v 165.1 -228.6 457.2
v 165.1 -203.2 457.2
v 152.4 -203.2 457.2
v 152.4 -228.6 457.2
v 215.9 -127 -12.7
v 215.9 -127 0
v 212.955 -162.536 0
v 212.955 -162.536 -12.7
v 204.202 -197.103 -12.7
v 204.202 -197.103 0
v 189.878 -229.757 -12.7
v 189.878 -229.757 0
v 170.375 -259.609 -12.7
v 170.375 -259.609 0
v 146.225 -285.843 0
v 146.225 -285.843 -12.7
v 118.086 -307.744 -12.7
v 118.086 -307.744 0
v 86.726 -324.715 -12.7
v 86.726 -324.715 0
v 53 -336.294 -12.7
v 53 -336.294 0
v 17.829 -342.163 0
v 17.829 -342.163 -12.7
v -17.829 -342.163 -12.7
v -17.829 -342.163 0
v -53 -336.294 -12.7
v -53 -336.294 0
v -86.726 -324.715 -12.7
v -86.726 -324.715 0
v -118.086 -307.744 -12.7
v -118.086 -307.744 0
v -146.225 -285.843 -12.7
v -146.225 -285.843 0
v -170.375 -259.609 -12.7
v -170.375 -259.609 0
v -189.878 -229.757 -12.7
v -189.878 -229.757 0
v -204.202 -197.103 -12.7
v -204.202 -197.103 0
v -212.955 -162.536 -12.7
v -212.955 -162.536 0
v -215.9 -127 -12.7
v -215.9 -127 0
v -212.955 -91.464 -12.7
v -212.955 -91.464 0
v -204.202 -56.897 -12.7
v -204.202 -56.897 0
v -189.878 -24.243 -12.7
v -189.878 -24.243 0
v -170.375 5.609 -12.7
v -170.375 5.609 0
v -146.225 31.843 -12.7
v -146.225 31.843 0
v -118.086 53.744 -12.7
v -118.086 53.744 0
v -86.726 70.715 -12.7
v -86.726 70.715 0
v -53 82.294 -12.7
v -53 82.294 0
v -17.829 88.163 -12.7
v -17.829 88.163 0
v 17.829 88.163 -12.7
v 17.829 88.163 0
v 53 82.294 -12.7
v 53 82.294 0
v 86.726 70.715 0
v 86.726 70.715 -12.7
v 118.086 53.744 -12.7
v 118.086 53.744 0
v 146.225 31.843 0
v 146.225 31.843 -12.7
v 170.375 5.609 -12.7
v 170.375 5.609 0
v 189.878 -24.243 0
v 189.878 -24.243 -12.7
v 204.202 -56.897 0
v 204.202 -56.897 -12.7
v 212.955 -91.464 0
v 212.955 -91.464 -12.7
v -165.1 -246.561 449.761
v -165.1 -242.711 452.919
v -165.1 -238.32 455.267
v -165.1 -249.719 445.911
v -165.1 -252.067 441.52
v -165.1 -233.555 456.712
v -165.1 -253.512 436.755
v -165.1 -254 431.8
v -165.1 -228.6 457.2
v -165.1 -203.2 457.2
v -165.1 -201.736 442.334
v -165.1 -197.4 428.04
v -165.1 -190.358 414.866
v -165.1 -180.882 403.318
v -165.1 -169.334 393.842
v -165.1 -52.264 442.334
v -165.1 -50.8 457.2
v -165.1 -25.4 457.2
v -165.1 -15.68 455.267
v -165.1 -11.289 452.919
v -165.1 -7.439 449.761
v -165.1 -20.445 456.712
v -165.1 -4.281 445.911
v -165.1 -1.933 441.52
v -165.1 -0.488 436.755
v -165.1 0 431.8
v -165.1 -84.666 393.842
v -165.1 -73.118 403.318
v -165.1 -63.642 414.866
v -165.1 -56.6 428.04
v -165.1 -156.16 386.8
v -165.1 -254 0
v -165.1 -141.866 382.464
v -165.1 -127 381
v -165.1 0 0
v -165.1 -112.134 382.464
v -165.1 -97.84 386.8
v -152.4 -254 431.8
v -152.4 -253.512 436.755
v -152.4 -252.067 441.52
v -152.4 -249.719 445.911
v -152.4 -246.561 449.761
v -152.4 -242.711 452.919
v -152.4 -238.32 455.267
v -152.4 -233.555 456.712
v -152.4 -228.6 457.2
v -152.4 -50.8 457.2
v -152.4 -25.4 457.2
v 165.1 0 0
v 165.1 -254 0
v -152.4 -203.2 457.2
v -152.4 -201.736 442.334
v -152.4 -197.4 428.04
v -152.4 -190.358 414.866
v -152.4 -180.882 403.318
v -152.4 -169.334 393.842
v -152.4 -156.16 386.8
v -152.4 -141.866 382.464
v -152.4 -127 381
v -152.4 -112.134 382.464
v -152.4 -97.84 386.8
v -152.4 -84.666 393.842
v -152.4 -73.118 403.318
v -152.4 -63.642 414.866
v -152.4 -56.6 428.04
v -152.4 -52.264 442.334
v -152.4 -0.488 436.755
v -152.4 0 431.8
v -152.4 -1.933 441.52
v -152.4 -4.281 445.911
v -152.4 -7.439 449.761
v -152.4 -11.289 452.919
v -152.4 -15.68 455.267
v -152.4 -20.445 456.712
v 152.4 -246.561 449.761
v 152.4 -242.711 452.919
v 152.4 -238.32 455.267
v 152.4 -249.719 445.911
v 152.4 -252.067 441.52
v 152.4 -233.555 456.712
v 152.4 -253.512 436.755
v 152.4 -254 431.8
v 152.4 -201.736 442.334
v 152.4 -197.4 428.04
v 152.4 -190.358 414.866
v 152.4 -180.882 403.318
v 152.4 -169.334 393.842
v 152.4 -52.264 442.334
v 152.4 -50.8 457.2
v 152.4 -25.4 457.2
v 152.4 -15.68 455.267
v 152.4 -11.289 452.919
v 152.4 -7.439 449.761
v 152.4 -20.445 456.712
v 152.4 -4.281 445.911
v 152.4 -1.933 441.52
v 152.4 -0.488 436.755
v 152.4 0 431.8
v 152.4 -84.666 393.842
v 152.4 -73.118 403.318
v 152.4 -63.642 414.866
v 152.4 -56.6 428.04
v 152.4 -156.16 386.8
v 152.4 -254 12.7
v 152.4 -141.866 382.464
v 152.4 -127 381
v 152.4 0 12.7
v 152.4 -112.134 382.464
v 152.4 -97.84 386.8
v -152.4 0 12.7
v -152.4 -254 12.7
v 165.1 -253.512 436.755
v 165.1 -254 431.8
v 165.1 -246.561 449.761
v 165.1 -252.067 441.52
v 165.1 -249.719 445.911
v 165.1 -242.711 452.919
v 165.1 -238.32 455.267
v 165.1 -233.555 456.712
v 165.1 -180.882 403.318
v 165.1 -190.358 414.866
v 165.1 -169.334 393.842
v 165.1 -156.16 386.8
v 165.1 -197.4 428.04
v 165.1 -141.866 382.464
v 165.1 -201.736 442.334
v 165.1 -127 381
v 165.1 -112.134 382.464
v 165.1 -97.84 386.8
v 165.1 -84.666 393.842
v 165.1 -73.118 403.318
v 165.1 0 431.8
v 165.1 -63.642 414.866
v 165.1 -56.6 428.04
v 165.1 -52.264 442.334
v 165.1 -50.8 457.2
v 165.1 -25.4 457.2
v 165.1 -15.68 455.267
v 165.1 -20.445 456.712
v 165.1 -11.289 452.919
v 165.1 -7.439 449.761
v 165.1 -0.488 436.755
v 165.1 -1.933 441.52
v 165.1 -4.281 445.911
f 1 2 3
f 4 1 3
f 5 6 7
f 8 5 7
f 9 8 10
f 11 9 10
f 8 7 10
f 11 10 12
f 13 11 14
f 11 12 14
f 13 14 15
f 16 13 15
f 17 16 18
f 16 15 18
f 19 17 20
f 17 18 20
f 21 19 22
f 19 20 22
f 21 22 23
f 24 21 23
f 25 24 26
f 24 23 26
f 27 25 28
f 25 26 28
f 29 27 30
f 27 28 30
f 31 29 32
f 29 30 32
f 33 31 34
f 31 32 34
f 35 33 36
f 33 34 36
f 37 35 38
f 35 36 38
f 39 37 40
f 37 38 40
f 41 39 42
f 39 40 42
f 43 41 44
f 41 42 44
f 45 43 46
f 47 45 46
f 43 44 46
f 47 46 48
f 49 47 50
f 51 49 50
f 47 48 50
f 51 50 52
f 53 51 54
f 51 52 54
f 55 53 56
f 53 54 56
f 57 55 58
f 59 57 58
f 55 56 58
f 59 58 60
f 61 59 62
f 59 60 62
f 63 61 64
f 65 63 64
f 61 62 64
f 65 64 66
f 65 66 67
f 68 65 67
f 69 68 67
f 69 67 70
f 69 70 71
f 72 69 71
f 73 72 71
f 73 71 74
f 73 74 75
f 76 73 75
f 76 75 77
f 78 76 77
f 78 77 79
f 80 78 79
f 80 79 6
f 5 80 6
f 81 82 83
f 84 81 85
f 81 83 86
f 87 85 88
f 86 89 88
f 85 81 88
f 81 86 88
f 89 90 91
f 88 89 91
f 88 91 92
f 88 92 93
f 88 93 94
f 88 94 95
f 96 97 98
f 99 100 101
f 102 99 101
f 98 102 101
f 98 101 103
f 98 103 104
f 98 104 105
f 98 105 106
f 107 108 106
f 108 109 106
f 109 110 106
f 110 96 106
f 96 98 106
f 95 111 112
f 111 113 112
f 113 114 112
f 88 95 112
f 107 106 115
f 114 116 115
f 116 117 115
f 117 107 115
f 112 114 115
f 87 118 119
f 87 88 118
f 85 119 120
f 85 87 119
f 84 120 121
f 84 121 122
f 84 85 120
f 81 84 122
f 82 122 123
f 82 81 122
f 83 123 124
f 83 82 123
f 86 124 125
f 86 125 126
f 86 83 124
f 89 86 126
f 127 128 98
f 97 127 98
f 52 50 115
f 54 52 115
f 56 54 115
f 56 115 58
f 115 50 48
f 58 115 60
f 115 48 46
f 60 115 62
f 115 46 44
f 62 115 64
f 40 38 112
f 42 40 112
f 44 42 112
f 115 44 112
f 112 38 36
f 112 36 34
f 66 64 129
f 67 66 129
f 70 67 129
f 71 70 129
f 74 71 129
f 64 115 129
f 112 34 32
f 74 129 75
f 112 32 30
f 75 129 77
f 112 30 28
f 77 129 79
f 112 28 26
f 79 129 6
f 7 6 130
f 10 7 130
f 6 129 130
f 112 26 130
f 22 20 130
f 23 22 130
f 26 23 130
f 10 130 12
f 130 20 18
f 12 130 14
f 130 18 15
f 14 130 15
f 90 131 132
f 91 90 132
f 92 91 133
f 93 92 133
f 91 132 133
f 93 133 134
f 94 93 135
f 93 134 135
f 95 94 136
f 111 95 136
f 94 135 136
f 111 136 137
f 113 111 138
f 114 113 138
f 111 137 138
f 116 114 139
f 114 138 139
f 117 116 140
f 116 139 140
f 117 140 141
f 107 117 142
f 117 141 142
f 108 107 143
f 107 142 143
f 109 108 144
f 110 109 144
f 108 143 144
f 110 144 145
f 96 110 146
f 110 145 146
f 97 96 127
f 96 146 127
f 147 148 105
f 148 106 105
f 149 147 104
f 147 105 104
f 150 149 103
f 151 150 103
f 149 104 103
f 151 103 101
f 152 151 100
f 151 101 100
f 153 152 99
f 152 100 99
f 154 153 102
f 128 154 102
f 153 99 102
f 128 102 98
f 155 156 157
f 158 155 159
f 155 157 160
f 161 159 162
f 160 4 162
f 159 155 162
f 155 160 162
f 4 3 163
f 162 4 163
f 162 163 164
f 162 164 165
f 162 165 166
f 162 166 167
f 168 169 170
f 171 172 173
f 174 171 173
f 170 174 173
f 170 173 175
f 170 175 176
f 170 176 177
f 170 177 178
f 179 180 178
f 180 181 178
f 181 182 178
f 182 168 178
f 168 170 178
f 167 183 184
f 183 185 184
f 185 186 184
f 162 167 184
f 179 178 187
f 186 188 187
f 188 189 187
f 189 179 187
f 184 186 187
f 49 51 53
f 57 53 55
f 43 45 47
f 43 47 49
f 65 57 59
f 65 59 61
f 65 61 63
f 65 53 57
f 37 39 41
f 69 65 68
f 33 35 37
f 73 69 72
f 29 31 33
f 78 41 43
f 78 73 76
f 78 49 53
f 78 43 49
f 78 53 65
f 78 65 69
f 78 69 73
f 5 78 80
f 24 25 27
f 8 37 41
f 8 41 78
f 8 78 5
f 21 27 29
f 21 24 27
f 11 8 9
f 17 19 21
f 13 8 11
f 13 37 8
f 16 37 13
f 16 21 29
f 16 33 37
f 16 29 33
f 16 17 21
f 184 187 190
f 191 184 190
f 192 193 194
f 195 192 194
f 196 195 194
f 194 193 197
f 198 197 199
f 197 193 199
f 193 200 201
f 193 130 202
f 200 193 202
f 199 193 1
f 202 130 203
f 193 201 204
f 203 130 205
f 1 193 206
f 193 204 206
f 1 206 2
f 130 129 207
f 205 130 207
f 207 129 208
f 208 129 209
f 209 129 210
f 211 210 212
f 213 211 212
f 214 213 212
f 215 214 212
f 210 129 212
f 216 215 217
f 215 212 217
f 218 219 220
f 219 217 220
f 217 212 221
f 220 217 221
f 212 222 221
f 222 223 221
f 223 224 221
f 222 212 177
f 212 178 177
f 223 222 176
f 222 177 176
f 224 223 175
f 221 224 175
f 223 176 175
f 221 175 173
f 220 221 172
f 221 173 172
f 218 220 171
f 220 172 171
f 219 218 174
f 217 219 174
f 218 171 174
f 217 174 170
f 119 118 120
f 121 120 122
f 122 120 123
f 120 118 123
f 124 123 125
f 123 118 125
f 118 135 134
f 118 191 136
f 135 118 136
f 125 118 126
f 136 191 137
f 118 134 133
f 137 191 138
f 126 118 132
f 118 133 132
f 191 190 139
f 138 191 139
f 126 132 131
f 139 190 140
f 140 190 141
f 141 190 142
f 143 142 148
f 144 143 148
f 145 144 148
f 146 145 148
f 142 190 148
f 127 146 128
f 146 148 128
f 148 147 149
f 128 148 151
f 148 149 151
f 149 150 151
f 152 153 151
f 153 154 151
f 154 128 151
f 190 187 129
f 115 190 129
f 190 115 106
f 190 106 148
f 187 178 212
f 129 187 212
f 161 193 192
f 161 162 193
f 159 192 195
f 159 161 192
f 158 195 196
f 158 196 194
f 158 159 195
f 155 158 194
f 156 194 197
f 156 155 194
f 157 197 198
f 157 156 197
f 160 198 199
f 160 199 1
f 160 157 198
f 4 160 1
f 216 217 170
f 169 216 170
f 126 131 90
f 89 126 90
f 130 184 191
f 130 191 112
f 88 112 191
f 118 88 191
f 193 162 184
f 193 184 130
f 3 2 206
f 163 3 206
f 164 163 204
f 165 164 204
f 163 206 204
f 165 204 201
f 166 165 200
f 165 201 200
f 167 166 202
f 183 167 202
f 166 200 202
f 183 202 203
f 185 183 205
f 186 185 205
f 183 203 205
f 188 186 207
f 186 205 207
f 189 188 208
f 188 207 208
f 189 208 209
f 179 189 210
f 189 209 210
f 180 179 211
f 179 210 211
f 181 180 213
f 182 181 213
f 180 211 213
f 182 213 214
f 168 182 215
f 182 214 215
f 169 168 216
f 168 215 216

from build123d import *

# Parameters (mm, degrees)
F1_DEPTH = 254
F2_R     = 215.9
F3_DEPTH = 12.7
F5_DEPTH = 381.001
F6_R     = 25.4


with BuildPart() as f1:
    # F0 (on Front) → F1 (new body)
    with BuildSketch(Plane.XZ):
        Polygon((-152.4, 12.7), (-152.4, 457.2), (-165.1, 457.2), (-165.1, 0), (165.1, 0), (165.1, 457.2), (152.4, 457.2), (152.4, 12.7), align=None)
    extrude(amount=F1_DEPTH)

    # F2 (on face) → F3 (join)
    with BuildSketch(Plane(origin=(0, 0, 0), x_dir=(1, 0, 0), z_dir=(0, 0, -1))):
        with Locations((0, 127)):
            Circle(F2_R)
    extrude(amount=F3_DEPTH)

    # F4 (on face) → F5 (cut, through all)
    with BuildSketch(Plane.YZ.offset(165.1)):
        with BuildLine():
            Line((-50.8, 457.2), (-203.2, 457.2))
            ThreePointArc((-203.2, 457.2), (-127, 381), (-50.8, 457.2))
        make_face()
    extrude(amount=-F5_DEPTH, mode=Mode.SUBTRACT)

    # F6
    f6_edges = [f1.edges().sort_by_distance(p)[0] for p in [
        (158.75, -254, 457.2),
        (158.75, 0, 457.2),
        (-158.75, 0, 457.2),
        (-158.75, -254, 457.2),
    ]]
    fillet(f6_edges, radius=F6_R)


solid = f1.part
